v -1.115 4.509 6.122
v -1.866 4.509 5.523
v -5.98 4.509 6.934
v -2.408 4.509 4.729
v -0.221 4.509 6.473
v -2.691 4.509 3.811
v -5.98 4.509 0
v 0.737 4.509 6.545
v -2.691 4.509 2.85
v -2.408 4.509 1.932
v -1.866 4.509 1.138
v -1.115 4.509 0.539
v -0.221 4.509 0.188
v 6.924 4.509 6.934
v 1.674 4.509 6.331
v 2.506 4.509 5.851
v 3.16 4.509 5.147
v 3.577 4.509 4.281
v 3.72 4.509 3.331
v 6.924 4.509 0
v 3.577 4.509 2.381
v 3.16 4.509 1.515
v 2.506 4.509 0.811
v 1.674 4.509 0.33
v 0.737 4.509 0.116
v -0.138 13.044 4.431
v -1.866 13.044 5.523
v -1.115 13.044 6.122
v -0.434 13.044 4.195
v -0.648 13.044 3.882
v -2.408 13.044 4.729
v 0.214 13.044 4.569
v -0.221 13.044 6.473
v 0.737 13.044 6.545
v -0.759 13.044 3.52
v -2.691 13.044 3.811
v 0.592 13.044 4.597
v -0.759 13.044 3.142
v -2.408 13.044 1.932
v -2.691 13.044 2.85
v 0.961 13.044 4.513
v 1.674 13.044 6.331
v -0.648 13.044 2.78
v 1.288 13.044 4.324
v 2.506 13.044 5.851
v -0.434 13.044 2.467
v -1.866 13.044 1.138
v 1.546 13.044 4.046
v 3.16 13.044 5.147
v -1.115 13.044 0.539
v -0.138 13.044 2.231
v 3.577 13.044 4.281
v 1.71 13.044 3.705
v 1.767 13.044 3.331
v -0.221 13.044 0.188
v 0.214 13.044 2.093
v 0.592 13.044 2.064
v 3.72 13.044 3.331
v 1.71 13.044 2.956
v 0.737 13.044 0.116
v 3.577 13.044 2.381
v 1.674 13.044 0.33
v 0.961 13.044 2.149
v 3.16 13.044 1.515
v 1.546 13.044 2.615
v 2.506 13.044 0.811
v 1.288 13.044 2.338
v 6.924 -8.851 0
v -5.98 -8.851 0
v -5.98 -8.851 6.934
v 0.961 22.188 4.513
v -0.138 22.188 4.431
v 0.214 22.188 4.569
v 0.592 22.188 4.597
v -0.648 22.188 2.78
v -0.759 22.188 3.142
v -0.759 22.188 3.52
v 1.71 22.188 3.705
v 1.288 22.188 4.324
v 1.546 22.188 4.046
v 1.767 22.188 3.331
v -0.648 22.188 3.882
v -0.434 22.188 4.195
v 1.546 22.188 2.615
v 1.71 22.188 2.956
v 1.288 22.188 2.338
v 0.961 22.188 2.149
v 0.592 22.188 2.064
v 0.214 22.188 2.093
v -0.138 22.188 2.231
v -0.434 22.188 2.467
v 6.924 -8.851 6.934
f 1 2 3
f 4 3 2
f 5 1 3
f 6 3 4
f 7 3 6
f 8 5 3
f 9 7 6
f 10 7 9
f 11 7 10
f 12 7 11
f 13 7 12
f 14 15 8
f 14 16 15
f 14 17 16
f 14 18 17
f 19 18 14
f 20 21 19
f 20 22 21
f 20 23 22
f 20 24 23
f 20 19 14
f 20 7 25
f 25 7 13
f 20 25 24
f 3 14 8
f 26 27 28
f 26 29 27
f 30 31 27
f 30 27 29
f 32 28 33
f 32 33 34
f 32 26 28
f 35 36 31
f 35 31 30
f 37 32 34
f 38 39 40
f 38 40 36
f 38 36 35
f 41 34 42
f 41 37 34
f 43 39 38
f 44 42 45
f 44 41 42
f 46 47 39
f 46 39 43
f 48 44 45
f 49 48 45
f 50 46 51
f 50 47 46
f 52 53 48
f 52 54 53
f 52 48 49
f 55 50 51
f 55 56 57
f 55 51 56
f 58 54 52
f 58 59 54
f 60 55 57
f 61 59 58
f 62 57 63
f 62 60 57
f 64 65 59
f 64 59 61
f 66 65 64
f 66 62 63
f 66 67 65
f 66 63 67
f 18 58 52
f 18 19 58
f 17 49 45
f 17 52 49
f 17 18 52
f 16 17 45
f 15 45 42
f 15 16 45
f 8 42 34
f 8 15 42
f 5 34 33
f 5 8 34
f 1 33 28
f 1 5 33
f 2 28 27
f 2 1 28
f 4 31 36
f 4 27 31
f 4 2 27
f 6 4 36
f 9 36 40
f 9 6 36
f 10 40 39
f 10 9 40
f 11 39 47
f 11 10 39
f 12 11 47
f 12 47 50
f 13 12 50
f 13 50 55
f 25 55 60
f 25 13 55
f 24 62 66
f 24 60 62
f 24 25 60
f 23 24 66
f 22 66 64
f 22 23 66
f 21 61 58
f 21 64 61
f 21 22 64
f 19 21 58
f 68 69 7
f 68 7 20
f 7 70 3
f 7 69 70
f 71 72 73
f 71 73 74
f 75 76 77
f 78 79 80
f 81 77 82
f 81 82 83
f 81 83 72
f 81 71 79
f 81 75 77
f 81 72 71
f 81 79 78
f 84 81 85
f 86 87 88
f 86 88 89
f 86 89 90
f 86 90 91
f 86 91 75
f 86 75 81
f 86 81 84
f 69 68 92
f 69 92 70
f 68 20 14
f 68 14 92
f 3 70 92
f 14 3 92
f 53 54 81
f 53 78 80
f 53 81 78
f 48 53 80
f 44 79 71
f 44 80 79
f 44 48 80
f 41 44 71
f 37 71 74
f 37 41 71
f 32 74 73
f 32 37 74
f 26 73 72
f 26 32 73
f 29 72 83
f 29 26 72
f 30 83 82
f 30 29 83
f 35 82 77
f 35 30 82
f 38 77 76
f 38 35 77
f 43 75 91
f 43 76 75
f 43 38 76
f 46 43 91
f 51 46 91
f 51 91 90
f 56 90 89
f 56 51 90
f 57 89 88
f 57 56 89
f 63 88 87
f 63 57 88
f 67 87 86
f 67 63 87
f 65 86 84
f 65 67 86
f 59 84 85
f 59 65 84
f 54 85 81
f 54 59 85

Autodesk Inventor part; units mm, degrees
ref_plane "YZ Plane" through (0, 0, 0) normal (1, 0, 0) x (0, 1, 0)
ref_plane "XZ Plane" through (0, 0, 0) normal (0, 1, 0) x (-1, 0, 0)
ref_plane "XY Plane" through (0, 0, 0) normal (0, 0, 1) x (1, 0, 0)
sketch "Sketch1" plane through (0, 0, 0) normal (0, 0, 1) x (1, 0, 0)
  line L0 (-5.9795, 4.5091) -> (6.9237, 4.5091)
  line L1 (6.9237, 4.5091) -> (6.9237, -8.8513)
  line L2 (6.9237, -8.8513) -> (-5.9795, -8.8513)
  line L3 (-5.9795, -8.8513) -> (-5.9795, 4.5091)
  point P0 (0, 0)
  dimension "d0" = 12.9032
  dimension "d1" = 13.3604
extrude "Extrusion1" add sketch "Sketch1" along normal blind 6.9342
sketch "Sketch2" plane through (-5.9795, 4.5091, 0) normal (0, 1, 0) x (1, 0, 0)
  circle A0 centre (6.4761, -3.3308) radius 3.2234
  point P0 (5.9795, 0)
  dimension "d4" = 6.4469
extrude "Extrusion2" add sketch "Sketch2" along normal blind 8.5344
sketch "Sketch3" plane through (0.4966, 13.0435, 3.3308) normal (0, 1, 0) x (1, 0, 0)
  circle A0 centre (0, 0) radius 1.27
  point P0 (-0.4966, 3.3308)
  dimension "d7" = 2.54
extrude "Extrusion3" add sketch "Sketch3" along normal blind 9.144
sketch "Sketch4" plane through (-5.9795, -8.8513, 0) normal (-1, 0, 0) x (0, 0, 1)
  point P0 (0, 8.8513)
properties part number "Aidan Sherry Switch"
